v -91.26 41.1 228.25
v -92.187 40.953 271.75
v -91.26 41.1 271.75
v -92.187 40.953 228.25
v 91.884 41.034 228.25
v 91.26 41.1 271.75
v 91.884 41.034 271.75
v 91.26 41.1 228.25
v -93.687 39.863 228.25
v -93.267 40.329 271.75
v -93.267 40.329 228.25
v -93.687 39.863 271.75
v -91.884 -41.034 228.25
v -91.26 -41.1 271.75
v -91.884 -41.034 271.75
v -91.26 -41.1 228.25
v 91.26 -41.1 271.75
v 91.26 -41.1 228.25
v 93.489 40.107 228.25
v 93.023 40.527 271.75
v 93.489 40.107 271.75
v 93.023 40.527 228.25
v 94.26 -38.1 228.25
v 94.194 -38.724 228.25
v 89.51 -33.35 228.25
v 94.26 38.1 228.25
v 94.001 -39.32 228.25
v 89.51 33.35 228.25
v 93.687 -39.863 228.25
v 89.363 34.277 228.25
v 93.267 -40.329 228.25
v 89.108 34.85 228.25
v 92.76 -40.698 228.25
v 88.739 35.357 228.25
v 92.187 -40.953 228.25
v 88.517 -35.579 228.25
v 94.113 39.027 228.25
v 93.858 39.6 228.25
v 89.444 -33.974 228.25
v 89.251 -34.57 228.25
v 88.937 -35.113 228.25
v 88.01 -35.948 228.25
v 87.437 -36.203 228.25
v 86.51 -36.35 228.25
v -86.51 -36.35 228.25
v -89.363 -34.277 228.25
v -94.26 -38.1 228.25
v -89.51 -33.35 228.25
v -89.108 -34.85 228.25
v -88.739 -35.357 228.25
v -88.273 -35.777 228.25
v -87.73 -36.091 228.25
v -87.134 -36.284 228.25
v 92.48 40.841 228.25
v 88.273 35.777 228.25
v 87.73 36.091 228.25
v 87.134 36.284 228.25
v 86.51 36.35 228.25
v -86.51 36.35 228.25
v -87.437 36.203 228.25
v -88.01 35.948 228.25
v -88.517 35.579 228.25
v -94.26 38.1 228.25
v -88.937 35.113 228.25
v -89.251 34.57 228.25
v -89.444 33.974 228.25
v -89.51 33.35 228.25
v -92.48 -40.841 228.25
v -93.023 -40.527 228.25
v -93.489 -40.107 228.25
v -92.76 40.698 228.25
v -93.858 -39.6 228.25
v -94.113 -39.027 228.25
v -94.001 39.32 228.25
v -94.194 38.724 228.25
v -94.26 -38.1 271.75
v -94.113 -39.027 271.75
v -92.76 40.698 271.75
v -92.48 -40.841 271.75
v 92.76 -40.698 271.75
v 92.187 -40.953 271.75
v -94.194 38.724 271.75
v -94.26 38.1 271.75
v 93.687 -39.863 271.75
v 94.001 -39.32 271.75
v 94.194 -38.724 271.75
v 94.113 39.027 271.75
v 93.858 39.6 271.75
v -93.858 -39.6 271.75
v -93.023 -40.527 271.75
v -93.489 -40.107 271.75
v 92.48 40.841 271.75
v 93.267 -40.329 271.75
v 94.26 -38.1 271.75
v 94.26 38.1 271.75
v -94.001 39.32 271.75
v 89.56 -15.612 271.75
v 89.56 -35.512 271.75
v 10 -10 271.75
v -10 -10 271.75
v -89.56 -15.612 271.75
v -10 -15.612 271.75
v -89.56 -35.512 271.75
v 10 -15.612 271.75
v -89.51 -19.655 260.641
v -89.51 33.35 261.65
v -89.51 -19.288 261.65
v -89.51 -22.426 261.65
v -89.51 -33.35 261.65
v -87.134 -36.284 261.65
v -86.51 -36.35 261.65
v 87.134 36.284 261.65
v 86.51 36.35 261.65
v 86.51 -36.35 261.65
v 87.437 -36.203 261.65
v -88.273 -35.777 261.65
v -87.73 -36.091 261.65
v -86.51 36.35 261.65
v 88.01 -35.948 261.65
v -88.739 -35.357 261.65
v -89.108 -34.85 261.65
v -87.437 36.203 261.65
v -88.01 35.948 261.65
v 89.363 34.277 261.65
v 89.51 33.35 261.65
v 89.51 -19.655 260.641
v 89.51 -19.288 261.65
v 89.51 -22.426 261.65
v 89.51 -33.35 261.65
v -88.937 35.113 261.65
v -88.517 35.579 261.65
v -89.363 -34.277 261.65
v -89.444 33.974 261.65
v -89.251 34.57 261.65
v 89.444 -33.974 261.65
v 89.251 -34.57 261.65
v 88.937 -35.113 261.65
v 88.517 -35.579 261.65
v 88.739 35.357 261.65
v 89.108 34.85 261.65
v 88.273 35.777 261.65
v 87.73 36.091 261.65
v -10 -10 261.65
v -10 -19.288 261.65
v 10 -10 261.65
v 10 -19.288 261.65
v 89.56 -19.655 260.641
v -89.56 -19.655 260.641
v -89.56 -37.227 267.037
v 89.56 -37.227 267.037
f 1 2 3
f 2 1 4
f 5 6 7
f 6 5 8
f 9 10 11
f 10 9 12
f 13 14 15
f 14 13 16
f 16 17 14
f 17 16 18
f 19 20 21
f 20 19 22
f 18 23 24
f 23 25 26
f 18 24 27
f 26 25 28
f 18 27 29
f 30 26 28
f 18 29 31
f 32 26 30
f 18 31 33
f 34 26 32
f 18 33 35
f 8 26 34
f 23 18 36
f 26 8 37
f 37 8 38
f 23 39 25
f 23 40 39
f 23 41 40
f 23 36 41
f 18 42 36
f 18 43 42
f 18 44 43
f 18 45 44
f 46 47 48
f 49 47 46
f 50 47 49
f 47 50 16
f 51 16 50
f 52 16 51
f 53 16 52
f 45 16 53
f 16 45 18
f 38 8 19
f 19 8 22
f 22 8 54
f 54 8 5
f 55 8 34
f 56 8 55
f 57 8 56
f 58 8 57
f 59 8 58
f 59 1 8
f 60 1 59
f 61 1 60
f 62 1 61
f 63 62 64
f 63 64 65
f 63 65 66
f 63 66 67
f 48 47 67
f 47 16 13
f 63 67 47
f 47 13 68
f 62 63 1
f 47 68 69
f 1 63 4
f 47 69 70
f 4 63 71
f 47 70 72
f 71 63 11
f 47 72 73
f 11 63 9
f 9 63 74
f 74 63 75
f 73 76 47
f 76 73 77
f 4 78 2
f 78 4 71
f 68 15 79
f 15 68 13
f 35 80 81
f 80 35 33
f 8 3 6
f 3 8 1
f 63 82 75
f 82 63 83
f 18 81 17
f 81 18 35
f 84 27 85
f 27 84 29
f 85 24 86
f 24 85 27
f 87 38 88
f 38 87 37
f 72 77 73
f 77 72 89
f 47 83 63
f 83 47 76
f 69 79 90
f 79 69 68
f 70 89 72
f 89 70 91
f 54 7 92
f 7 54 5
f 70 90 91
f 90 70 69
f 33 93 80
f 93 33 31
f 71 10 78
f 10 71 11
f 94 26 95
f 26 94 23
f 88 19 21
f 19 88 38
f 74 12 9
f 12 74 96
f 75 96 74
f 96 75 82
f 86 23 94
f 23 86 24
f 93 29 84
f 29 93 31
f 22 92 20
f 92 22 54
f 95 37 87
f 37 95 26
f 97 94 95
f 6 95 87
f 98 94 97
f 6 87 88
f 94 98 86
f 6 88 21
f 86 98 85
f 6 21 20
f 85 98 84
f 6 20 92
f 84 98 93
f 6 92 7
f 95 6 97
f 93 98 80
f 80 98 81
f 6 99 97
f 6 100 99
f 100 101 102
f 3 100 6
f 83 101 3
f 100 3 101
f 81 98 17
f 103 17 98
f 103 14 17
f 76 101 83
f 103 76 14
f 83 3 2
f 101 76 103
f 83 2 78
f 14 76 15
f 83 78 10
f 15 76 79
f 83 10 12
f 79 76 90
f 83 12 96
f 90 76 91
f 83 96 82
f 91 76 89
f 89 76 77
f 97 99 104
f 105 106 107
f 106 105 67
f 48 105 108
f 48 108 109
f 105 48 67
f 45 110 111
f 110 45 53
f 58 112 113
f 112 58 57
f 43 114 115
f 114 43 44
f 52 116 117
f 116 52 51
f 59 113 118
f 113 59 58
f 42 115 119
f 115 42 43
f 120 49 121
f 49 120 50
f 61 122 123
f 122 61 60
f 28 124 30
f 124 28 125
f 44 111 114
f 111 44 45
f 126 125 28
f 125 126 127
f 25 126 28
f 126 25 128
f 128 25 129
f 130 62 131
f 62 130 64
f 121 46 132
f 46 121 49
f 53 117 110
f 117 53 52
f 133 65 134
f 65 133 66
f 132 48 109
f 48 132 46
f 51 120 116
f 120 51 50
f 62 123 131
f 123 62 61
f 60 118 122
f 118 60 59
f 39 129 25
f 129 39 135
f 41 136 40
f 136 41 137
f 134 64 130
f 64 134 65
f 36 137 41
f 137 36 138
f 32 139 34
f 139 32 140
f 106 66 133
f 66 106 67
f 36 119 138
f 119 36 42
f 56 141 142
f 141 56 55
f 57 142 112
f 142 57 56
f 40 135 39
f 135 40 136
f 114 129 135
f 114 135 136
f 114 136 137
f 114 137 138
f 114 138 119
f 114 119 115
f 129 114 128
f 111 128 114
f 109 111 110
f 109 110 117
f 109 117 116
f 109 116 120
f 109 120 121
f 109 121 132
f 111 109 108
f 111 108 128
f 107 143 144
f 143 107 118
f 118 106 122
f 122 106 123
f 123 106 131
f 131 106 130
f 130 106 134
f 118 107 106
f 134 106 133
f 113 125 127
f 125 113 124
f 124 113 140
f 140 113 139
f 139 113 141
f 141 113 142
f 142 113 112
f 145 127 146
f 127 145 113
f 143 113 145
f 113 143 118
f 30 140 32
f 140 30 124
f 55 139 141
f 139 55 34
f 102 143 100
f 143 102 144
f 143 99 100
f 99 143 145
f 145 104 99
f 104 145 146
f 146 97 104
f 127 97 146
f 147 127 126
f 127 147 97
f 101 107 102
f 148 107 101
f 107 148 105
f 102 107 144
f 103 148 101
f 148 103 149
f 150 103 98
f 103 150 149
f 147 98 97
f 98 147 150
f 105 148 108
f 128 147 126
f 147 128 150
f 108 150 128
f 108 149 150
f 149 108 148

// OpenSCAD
// file: usbA-C.scad
/* [Hidden] */

TWEAK = 1;

module make_USBA(location = "UNKNOWN")
{
     // true measurements of usb.
     PUNCH_DIA = 6 + TWEAK;
     PUNCH_WIDTH = 11.0 + TWEAK;
     PUNCH_DIST = PUNCH_WIDTH - PUNCH_DIA;
     PUNCH_LENGTH = 17.0;

     // this is the hole punch size
     USB_DIA = 1.92 + TWEAK/2;
     USB_WIDTH = 7.0 + TWEAK/2;
     USB_DIST = PUNCH_WIDTH - PUNCH_DIA;
     USB_LENGTH = 5.68;
    

    mUSB_DIA = (location == "ABOVE") ? +USB_DIA/2 : location == "BELOW" ? -USB_DIA/2: 0;
    
    translate([ 0, mUSB_DIA, 0])  
    {
         if ($preview)
         {
             color("PINK")
             translate( [-PUNCH_WIDTH , -mUSB_DIA, 0])  // one face to sit 'on the board'
             rotate([90, 90, 0])
             cube( [PUNCH_WIDTH * 2, PUNCH_WIDTH * 2, 0.1], center = false);    // targeting plane
         }
         
         //translate( [0, USB_DIA/2, 0])  // one face to sit 'on the board'
         {
             color("YELLOW", .3)
             hull()
             {
                 translate([ PUNCH_DIST /2, 0, 0 ])
                 cylinder(h = PUNCH_LENGTH, d = PUNCH_DIA, $fn=100);
                 
                 translate([ -PUNCH_DIST /2, 0, 0 ])
                 cylinder(h = PUNCH_LENGTH, d = PUNCH_DIA, $fn=100);
             }
             
             rotate([180, 0, 0])
             #hull()
             {
                 translate([ USB_DIST /2, 0, 0 ])
                 cylinder(h = USB_LENGTH, d = USB_DIA, $fn=100);
                 
                 translate([ -USB_DIST /2, 0, 0 ])
                 cylinder(h = USB_LENGTH, d = USB_DIA, $fn=100);
             }
         }
     }
}

module make_USBC( location = "UNKNOWN")
{
     PUNCH_DIA = 6.10 + TWEAK;
     PUNCH_WIDTH = 10.9 + TWEAK;
     PUNCH_DIST = PUNCH_WIDTH - PUNCH_DIA;
     PUNCH_LENGTH = 14.0;

    // true usb metal dimensions.
     USB_DIA = 2.54 + TWEAK/2;
     USB_WIDTH = 8.25 + TWEAK/2;
     USB_DIST = PUNCH_WIDTH - PUNCH_DIA;
     USB_LENGTH = 7.47;

    mUSB_DIA = (location == "ABOVE") ? +USB_DIA/2 : location == "BELOW" ? -USB_DIA/2: 0;
    
    translate([ 0, mUSB_DIA, 0])  
    {
         if ($preview)
         {
             color("GREY")
             translate( [-PUNCH_WIDTH , -mUSB_DIA, 0])  // one face to sit 'on the board'
             rotate([90, 90, 0])
             cube( [PUNCH_WIDTH * 2, PUNCH_WIDTH * 2, 0.1], center = false);    // targeting plane
         }
         
         //translate( [0, USB_DIA/2, 0])  // one face to sit 'on the board'
         {
             color("ORANGE", .3)
             hull()
             {
                 translate([ PUNCH_DIST /2, 0, 0 ])
                 cylinder(h = PUNCH_LENGTH, d = PUNCH_DIA, $fn=100);
                 
                 translate([ -PUNCH_DIST /2, 0, 0 ])
                 cylinder(h = PUNCH_LENGTH, d = PUNCH_DIA, $fn=100);
             }
             
             rotate([180, 0, 0])
             #hull()
             {
                 translate([ USB_DIST /2, 0, 0 ])
                 cylinder(h = USB_LENGTH, d = USB_DIA, $fn=100);
                 
                 translate([ -USB_DIST /2, 0, 0 ])
                 cylinder(h = USB_LENGTH, d = USB_DIA, $fn=100);
             }
         }
     }

}
translate([20, 0, 0])
make_USBA("ABOVE");
translate([40,0, 0])
make_USBA("CENTER");
translate([60, 0, 0])
make_USBA("BELOW");
/*
translate([ 0, 10, 0])
{
    translate([20, 0, 0])
    make_USBC("ABOVE");
    translate([40,0, 0])
    make_USBC("CENTER");
    translate([60, 0, 0])
    make_USBC("BELOW");
}
*/
//make_USBC("CENTER");
// file: myTools.scad
module tube (r = 0, d = 0, l = 0, 
            thick = 0, 
            bCentered = true, 
            taper_pct = 0, 
            circlip = false) // r=radius d=dia l=length 
{
    assert( r != 0 || d != 0, "specify one of radius or diameter");
    assert( l != 0 , "tube: need length 'l' to be non zero");
    assert( thick != 0, "wall thickness cannot be zero");

    punch = $preview ? .2 : 0; // stop funny view artifact

    dia = r ? r * 2 : d;

    od = ((thick > 0) ? dia + thick * 2 : dia);
    id = (thick > 0) ? dia             : dia  + thick *2; 

    
    
    if (thick > 0)
        echo ("tube\tMIN id = ", id, "od = ", od, "wall = ", thick, "center= ", bCentered);
    else
        echo ("tube\tMAX od = ", od, "id = ", id, "wall = ", thick, "center= ", bCentered);

    echo ("tube\tHeigth = ", l);
        
    if (taper_pct != 0)
    {
        echo ("tube\t*** OD expanded by ", taper_pct, "%, : bottom od = ", od * (1. +taper_pct/100), "top od = ", od);
    }
    
    assert(dia || dia < 0, "tube : missing r or d ");
    
    // if taper_pct specified, the base will always be closest to 0,0,0
    translate([ 0, 0, taper_pct == 0 ? 0: bCentered ? l/2:l  ])
    rotate([0, taper_pct == 0 ? 0 : 180, 0 ])

    difference()
    {
        // make a reese's cup
        {
            color("YELLOW", .3)
            linear_extrude(height= l, scale = 1 + taper_pct/100)
                difference()
                {
                    circle(d = od);
                    circle(d = .5);
                }
        }
    
     // hollow out reessed cup
     color("GREEN")
     translate([0, 0, -punch/2])
     linear_extrude(height= l+ punch*2, $fn=100)
     {
        circle(d = id);
        if (circlip) #square([1 + punch, od ]);
     }
    
    }
}
//==============================================================================
        
module abox (dims, 
            thick = 0, 
            bCentered = true, 
            round_out = 0, 
            round_in = 0, 
            bSolid = false,
            bHollow = false,
            elevator = 0)   // move bottom up by X
{
    punch = $preview ? .1 : 0; // stop funny view artifact
    
    assert(thick != 0, "Thick must be specified. +=outside dim, -= inside dims");
    assert(dims.z > thick, "wall thickness too large for depth of box");

    wall2 = abs(thick) * 2; // 2 walls in each direction
    wall = wall2 / 2;
    
    // box either grows inward (thick < 0) or outward (thick > 0)  from dims
    fat = dims + [ wall2, wall2, wall];
    thin = dims - [ wall2, wall2, wall];
    
    offset = (thick > 0 && bCentered == false) ? wall : 0;
    
    //echo ("abox : adjusting x,y,z by ", offset, " to move origin from  center to 0,0,0");
    translate( [ bCentered ? 0 : dims.x /2 + offset, bCentered ? 0 : dims.y /2 + offset, bCentered ? 0 : dims.z /2 + offset/2]) 
    {
        if (thick > 0)
        {   
            // wall grows outwards from users dim
            echo ("making a box, MAX INSIDE dim = ", dims, "a wall=", thick, "mm ... max outside = ", fat, " mm");
        }
        else
        {
            // wall grows inward from users dime
            echo ("making a box, MAX OUTSIDE dim = ", dims, "a wall=", thick, "mm ... min inside = ", thin, " mm");
        }
        
        // linear extrude alway works in the positive x/y plane an goes upward.
        // after calc, re-center about 0,0,0 where a bCentered cube would be
        
        translate([ 0, 0, thick > 0  ? -fat.z/2 : -dims.z/2 ])
        difference()
        {
            echo ("round_out = ", round_out);

            // MAKE SOLID BOX --------------------------------------
            router_outside = round_out ? round_out : 0;
            x = thick > 0  ? fat.x - router_outside : dims.x - router_outside;
            y = thick > 0  ? fat.y - router_outside : dims.y - router_outside;


            // MAKE PUCHNED INSIDE
            // using 'offset' it will add r on all dimensions, then round., 
            // so now you have fatter perimeter than you started with :(
            //  but at least the corners are round.
            
            // Compensate by shrinking dimension by r, 
            // and then by calling offset, offset will then add it back

            color("YELLOW", .2)

            linear_extrude(thick > 0  ? fat.z : dims.z)
            if (round_out)
            {
                offset( r= round_out, $fn=30)
                square( [x - router_outside, y - router_outside], true);
            }
            else square( [x - router_outside, y - router_outside], true);
           
            // time to punch out the inside if requested.
            if (bSolid == false)
            {
                hollow_offset = bHollow ? fat.z/2 + .2  : dims.z/2 +.2;
                // punching out inside. its either dims or thin.
                router_inside = round_in;
                echo ("round_in = ", router_inside);
                xi = thick > 0  ? dims.x  : thin.x;
                yi = thick > 0  ? dims.y : thin.y ;

                color("GREEN")

                // move 'punch' up if you need a bottom else zero (hollowed out)

                translate([ 0,0, bHollow ? -.1 : wall + elevator]) 
                linear_extrude(thick > 0  ? fat.z - wall  + hollow_offset : dims.z - wall + hollow_offset)
                //#linear_extrude(fat.z - wall  + hollow_offset)
                
                if (round_in) 
                {
                    offset( r= round_in, $fn=30)
                    square( [ xi - router_inside, yi - router_inside], true);
                }
                else
                    square( [ xi, yi], true);
            }
        }
    }
 }


// 50x25x10 box walls grow inward (-2). on center origin midpoint
// rounded outside (default), sharp corner inside(default), bCentered about 0,0,0
//color("GREEN", .9)
//abox([50,25, 10], -2, true); 


// 50x25x10 box walls grow inward (-2). on center origin midpoint
// sharp outside corners, rounded inside corners. Sit on x,y plane
color("BLUE", .9)
abox([50,20, 10], +2, round_in=2, bCentered = false);  // 50x25x10 box inside dim origin has 0,0


// 50x25x10 box walls grow inward (-2). on center origin midpoint
// sharp corners inside and out. sits on x,y plane
color("GREY", .9)//
translate([ 55, 0, 0])      
abox([50,20, 10], +2, round_out=3, false);

color("PINK", .9)//
translate([ 115, 10, 10])      
abox([86.66, 56.865, 5], -5, bHollow = true, bCentered = false); 

color("GREEN", .9)//
translate([ 140, 10, -10])      
abox([86.66, 56.865, 5], 3, bHollow = true, bCentered = false); 

/*
// 50x25x10 box walls grow inward (-2). on center origin midpoint
// round corners outside and SOLID
color("BLUE", .9)//
translate([ 55, 0, 0])      
abox([50,25, 10], +2, round_out=2, round_in=0, false, bSolid = true); // 50x25x10 box outside dim origin is 0,0
*/

//translate ([-30,-30, 0])
{
/*
    // tube outer dia  20, inner dia = (20 - 8)
    color("PINK")
    tube (d = 20, l = 20, thick = -8, bCentered = false);

    // tube, inner dia = (2* 10), outer dia = ((2*10) + 2) 
    color("PURPLE", .3)
    tube (r = 10, l = 20, thick = +2, bCentered= true);
*/
/*
    tube (d = 60, l = 20, thick = -6, bCentered = false);

    translate([0, 0, 50])
    tube (d = 60, l = 20, thick = -6, bCentered = false, taper_pct = 20, circlip = true);
    //color("GREEN")
    //tube (d = 20, l = 20, thick = -2, bCentered = false, taper = 10, circlip = true);
*/

}
// main file
use <myTools.scad>
use <usbA-C.scad>

MM=25.43;


bMakeFrame = false; //true;
bMakeBottom = false; //true;
bMakeBackSide = false; //true; //true;
bMakeFoot = false; //true;
bMakeAlt = true;

inside_length = 6 * MM + 17.49 + 1.25;
inside_width = 111.23 + .5 ;
outside_height = 5;
BEZEL_THICK = 3.5;


flex_cable_wide = inside_length - 2 * 74 ;
flex_cable_offset = inside_length - 74;
MYLAR_FEED = [flex_cable_wide, 2, 9 ];


if (bMakeBottom)
{
    difference()
    {
        // don't need box to have max emptyness, raise floor via elevator = 3
        abox([inside_length, inside_width, outside_height], thick = +BEZEL_THICK, elevator = 2);

        translate([ -MYLAR_FEED.x/2,  
                    inside_width/2 - BEZEL_THICK + MYLAR_FEED.y/2 + 2 ,
                    -MYLAR_FEED.z * 3/4 + .5 ])
        color("RED")
        cube(MYLAR_FEED , center = false);
        

    }
}
//----------------------------------------------------------------------------------------

if (bMakeFrame)
{
    //
    //  MAKE HOLD DOWN FRAME

    LCD_WHITE_BOARDER = 1.6 + .5;
    NOTCH = .86;

    translate([ 0,0,50])
    union()
    {
        // don't need box to have max emptyness, raise floor via elevator = 3
        color("CYAN")
        abox([inside_length, inside_width, outside_height], thick = +BEZEL_THICK, bHollow = true, bCentered = true);

        // make small ridge .7mm high on the inside of the frame above
        translate([0, 0 , .7/2])
        color("PURPLE")
        abox([inside_length, inside_width, outside_height * 2 - .7 ],
                thick = -(LCD_WHITE_BOARDER),
                bHollow = true, bCentered=true);

        // hide white frame of display
        // don't need box to have max emptyness, raise floor via elevator = 3
        color("BLUE")
        translate([0, -inside_width/2 + BEZEL_THICK , 0])
        abox([inside_length, LCD_WHITE_BOARDER, outside_height], thick = +BEZEL_THICK, bSolid = true, bCentered = true);


    }
}


box_height = 40;

if (bMakeBackSide)
{
    translate([ 0,0, 120])
    {
        difference()
        {
            color("GREEN", .5)
            rotate([-180, 0, 0])
            {
                abox([inside_length + BEZEL_THICK *2 + .7, 
                      inside_width + BEZEL_THICK *2 + .7, 
                      box_height], 
                      thick = +BEZEL_THICK, 
                      bHollow = false, bCentered = true, round_out=3);
            }
            
            translate([0,0, -box_height/2 +2])
            #cylinder(h = box_height, d= 25.4 * 5 /8);
            
            // position usb from the center line, not from a wall.
            translate([ (inside_length + BEZEL_THICK *3)/2 -2, 
                        (inside_width + BEZEL_THICK *3)/2 - 51, 
                         box_height/2 - 33.8/4])
            rotate([ 90, 0, 90])
            #make_USBA();
        }
    }
}

if (bMakeFoot)
{
    translate([ 0,0, 180])
    {
        difference()
        {
            color("PURPLE", .5)
            rotate([-180, 0, 0])
            {
                abox([inside_length + BEZEL_THICK *2 + .7 + 10,  // foot is bigger 
                      inside_width + BEZEL_THICK *2 + .7 + 10,   // foot is bigger
                      box_height * 4/8],                         // foot is thinner
                      thick = +BEZEL_THICK, 
                      bSolid = true, bCentered = true, round_out=3); // make solid
            }

            
            // punch out the LcD display at an angle.
            translate([ 0, -15, 61]) // just make it catch front lip
            rotate([70, 0, 0])
            {
                abox([inside_length + BEZEL_THICK *2 + .8, 
                      inside_width + BEZEL_THICK *2 + .8, 
                      box_height+ .7], 
                      thick = +BEZEL_THICK, 
                      bSolid = true, bCentered = true, round_out=3);
            }
            
        }
    }
}

alt_width = 65;
if (bMakeAlt)
{
    translate([ 0,0, 250])
    {
        difference()
        {
            color("PURPLE", .3)
            rotate([-180, 0, 0])
            {
                abox([inside_length + BEZEL_THICK  + .7 + 6,  // foot is bigger 
                      alt_width + BEZEL_THICK  + .7 + 6,   // foot is bigger
                      box_height ],                         // foot is thinner
                      thick = +BEZEL_THICK, 
                      bSolid = true, bCentered = true, round_out=3); // make solid
            }
            
            
            // hollow out bottom. pass 1
            UP = 5;
            translate([0, 0, -UP -.1])
            rotate([-180, 0, 0])
            {
                abox([inside_length  + .7,  
                      alt_width +  .7,  
                      box_height * 3/4],   
                      thick = +BEZEL_THICK, 
                      bSolid = true, bCentered = true, round_out=3); // make solid
            }
            off = 25;
            // small cutout for mylar connector
            cutout = [ 20, 10, box_height + BEZEL_THICK];
            translate([ -cutout.x/2 , off -cutout.y/2 -30 , cutout.z/2])
            rotate([-180, 0, 0])
            #cube ( cutout);

 
            // punch out the LcD display at an angle.
            translate([ 0, -33 + off, 70]) // just make it catch front lip
            rotate([70, 0, 0])
            {
                #abox([inside_length + .8, 
                      inside_width + .8, 
                      18 - BEZEL_THICK + .7], 
                      thick = +BEZEL_THICK,  
                      bSolid = true, bCentered = true);
            }
            
        }
    }
}
